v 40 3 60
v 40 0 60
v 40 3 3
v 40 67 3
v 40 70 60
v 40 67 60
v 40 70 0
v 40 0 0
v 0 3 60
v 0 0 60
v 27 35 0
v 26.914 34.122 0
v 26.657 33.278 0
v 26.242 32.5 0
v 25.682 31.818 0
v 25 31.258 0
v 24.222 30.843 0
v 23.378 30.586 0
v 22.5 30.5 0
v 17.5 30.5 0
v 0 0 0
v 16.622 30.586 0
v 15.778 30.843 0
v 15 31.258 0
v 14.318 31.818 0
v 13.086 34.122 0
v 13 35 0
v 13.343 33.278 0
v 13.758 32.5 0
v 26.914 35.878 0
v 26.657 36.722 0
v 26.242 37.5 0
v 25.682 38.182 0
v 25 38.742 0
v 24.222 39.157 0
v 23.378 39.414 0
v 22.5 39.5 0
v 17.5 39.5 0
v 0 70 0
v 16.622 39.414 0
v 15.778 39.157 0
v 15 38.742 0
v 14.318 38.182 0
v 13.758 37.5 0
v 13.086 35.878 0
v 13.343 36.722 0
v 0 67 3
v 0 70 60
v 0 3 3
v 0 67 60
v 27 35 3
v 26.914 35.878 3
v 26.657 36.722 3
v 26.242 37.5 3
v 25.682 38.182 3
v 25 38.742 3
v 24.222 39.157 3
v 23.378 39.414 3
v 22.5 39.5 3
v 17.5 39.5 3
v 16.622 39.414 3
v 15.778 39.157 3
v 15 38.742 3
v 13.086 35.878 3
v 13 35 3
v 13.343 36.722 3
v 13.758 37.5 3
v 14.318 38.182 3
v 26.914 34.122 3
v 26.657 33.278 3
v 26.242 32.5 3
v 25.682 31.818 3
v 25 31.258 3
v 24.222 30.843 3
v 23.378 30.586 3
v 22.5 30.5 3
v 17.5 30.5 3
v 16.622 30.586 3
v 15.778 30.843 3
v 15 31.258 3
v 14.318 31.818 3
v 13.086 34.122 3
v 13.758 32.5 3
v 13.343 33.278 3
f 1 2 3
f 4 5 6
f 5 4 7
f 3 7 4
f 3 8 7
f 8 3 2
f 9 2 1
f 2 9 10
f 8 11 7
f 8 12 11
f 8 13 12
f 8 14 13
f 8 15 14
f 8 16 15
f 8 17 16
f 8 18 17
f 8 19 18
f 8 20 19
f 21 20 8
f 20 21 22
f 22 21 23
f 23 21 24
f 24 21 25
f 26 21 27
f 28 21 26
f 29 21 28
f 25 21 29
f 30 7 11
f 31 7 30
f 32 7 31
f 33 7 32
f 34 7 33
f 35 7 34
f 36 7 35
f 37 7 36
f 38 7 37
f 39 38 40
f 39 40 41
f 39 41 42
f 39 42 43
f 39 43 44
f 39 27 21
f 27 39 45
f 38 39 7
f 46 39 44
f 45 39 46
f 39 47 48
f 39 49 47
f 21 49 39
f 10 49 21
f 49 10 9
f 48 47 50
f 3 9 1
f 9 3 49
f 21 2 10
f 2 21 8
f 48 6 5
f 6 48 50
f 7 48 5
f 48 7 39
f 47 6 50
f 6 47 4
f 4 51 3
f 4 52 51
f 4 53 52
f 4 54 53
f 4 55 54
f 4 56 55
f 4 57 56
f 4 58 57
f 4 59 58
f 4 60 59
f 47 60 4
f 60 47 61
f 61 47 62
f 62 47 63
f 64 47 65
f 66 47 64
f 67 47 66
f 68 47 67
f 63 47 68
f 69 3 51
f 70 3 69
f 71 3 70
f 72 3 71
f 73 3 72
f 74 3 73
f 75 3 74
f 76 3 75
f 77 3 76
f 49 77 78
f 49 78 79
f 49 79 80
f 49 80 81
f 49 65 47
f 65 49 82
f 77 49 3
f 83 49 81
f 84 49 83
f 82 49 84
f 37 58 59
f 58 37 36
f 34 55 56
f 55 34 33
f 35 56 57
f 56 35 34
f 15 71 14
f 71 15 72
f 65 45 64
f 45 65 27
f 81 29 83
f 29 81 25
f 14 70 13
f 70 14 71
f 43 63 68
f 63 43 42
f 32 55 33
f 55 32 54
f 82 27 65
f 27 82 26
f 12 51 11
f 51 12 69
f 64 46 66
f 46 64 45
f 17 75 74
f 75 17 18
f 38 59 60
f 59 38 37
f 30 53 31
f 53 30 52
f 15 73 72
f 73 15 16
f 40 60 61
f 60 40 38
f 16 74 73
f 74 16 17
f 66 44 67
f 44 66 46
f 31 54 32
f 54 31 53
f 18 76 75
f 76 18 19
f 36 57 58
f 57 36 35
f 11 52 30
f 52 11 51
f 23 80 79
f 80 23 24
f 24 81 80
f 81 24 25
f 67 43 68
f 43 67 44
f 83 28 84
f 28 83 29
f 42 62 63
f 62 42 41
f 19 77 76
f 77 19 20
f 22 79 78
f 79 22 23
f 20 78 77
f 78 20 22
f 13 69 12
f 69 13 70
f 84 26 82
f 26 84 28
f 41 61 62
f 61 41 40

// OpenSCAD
$fn = 32;

// ----------------------------------------------------------------------
// U-bracket: 40 x 70 x 60 mm
// ----------------------------------------------------------------------

// --- parameters (mm) ---
span = 40;                // outer length, X
outer_w = 70;             // outer width, Y
wall_h = 60;              // upright height, Z
plate_t = 3;              // wall thickness
hole_d = 9;               // clearance for M8
slot_l = 14;              // slot length

module hole_z(px, py) {
  translate([px, py, -2.5]) cylinder(h = plate_t + 5, d = hole_d);
}
module hole_y_pz(pz) {
  /* through both uprights along Y */
  translate([0, -2.5, pz]) rotate([-90, 0, 0]) cylinder(h = outer_w + 5, d = hole_d);
}
module slot_z(px, py) {
  hull() {
    translate([px - (slot_l - hole_d) / 2, py, -2.5]) cylinder(h = plate_t + 5, d = hole_d);
    translate([px + (slot_l - hole_d) / 2, py, -2.5]) cylinder(h = plate_t + 5, d = hole_d);
  }
}

module base() {
  cube([span, outer_w, plate_t]);
}

module uprights() {
  cube([span, plate_t, wall_h]);
  translate([0, outer_w - plate_t, 0]) cube([span, plate_t, wall_h]);
}

difference() {
  union() {
    base();
    uprights();
  }
  slot_z(20, 35);
}
